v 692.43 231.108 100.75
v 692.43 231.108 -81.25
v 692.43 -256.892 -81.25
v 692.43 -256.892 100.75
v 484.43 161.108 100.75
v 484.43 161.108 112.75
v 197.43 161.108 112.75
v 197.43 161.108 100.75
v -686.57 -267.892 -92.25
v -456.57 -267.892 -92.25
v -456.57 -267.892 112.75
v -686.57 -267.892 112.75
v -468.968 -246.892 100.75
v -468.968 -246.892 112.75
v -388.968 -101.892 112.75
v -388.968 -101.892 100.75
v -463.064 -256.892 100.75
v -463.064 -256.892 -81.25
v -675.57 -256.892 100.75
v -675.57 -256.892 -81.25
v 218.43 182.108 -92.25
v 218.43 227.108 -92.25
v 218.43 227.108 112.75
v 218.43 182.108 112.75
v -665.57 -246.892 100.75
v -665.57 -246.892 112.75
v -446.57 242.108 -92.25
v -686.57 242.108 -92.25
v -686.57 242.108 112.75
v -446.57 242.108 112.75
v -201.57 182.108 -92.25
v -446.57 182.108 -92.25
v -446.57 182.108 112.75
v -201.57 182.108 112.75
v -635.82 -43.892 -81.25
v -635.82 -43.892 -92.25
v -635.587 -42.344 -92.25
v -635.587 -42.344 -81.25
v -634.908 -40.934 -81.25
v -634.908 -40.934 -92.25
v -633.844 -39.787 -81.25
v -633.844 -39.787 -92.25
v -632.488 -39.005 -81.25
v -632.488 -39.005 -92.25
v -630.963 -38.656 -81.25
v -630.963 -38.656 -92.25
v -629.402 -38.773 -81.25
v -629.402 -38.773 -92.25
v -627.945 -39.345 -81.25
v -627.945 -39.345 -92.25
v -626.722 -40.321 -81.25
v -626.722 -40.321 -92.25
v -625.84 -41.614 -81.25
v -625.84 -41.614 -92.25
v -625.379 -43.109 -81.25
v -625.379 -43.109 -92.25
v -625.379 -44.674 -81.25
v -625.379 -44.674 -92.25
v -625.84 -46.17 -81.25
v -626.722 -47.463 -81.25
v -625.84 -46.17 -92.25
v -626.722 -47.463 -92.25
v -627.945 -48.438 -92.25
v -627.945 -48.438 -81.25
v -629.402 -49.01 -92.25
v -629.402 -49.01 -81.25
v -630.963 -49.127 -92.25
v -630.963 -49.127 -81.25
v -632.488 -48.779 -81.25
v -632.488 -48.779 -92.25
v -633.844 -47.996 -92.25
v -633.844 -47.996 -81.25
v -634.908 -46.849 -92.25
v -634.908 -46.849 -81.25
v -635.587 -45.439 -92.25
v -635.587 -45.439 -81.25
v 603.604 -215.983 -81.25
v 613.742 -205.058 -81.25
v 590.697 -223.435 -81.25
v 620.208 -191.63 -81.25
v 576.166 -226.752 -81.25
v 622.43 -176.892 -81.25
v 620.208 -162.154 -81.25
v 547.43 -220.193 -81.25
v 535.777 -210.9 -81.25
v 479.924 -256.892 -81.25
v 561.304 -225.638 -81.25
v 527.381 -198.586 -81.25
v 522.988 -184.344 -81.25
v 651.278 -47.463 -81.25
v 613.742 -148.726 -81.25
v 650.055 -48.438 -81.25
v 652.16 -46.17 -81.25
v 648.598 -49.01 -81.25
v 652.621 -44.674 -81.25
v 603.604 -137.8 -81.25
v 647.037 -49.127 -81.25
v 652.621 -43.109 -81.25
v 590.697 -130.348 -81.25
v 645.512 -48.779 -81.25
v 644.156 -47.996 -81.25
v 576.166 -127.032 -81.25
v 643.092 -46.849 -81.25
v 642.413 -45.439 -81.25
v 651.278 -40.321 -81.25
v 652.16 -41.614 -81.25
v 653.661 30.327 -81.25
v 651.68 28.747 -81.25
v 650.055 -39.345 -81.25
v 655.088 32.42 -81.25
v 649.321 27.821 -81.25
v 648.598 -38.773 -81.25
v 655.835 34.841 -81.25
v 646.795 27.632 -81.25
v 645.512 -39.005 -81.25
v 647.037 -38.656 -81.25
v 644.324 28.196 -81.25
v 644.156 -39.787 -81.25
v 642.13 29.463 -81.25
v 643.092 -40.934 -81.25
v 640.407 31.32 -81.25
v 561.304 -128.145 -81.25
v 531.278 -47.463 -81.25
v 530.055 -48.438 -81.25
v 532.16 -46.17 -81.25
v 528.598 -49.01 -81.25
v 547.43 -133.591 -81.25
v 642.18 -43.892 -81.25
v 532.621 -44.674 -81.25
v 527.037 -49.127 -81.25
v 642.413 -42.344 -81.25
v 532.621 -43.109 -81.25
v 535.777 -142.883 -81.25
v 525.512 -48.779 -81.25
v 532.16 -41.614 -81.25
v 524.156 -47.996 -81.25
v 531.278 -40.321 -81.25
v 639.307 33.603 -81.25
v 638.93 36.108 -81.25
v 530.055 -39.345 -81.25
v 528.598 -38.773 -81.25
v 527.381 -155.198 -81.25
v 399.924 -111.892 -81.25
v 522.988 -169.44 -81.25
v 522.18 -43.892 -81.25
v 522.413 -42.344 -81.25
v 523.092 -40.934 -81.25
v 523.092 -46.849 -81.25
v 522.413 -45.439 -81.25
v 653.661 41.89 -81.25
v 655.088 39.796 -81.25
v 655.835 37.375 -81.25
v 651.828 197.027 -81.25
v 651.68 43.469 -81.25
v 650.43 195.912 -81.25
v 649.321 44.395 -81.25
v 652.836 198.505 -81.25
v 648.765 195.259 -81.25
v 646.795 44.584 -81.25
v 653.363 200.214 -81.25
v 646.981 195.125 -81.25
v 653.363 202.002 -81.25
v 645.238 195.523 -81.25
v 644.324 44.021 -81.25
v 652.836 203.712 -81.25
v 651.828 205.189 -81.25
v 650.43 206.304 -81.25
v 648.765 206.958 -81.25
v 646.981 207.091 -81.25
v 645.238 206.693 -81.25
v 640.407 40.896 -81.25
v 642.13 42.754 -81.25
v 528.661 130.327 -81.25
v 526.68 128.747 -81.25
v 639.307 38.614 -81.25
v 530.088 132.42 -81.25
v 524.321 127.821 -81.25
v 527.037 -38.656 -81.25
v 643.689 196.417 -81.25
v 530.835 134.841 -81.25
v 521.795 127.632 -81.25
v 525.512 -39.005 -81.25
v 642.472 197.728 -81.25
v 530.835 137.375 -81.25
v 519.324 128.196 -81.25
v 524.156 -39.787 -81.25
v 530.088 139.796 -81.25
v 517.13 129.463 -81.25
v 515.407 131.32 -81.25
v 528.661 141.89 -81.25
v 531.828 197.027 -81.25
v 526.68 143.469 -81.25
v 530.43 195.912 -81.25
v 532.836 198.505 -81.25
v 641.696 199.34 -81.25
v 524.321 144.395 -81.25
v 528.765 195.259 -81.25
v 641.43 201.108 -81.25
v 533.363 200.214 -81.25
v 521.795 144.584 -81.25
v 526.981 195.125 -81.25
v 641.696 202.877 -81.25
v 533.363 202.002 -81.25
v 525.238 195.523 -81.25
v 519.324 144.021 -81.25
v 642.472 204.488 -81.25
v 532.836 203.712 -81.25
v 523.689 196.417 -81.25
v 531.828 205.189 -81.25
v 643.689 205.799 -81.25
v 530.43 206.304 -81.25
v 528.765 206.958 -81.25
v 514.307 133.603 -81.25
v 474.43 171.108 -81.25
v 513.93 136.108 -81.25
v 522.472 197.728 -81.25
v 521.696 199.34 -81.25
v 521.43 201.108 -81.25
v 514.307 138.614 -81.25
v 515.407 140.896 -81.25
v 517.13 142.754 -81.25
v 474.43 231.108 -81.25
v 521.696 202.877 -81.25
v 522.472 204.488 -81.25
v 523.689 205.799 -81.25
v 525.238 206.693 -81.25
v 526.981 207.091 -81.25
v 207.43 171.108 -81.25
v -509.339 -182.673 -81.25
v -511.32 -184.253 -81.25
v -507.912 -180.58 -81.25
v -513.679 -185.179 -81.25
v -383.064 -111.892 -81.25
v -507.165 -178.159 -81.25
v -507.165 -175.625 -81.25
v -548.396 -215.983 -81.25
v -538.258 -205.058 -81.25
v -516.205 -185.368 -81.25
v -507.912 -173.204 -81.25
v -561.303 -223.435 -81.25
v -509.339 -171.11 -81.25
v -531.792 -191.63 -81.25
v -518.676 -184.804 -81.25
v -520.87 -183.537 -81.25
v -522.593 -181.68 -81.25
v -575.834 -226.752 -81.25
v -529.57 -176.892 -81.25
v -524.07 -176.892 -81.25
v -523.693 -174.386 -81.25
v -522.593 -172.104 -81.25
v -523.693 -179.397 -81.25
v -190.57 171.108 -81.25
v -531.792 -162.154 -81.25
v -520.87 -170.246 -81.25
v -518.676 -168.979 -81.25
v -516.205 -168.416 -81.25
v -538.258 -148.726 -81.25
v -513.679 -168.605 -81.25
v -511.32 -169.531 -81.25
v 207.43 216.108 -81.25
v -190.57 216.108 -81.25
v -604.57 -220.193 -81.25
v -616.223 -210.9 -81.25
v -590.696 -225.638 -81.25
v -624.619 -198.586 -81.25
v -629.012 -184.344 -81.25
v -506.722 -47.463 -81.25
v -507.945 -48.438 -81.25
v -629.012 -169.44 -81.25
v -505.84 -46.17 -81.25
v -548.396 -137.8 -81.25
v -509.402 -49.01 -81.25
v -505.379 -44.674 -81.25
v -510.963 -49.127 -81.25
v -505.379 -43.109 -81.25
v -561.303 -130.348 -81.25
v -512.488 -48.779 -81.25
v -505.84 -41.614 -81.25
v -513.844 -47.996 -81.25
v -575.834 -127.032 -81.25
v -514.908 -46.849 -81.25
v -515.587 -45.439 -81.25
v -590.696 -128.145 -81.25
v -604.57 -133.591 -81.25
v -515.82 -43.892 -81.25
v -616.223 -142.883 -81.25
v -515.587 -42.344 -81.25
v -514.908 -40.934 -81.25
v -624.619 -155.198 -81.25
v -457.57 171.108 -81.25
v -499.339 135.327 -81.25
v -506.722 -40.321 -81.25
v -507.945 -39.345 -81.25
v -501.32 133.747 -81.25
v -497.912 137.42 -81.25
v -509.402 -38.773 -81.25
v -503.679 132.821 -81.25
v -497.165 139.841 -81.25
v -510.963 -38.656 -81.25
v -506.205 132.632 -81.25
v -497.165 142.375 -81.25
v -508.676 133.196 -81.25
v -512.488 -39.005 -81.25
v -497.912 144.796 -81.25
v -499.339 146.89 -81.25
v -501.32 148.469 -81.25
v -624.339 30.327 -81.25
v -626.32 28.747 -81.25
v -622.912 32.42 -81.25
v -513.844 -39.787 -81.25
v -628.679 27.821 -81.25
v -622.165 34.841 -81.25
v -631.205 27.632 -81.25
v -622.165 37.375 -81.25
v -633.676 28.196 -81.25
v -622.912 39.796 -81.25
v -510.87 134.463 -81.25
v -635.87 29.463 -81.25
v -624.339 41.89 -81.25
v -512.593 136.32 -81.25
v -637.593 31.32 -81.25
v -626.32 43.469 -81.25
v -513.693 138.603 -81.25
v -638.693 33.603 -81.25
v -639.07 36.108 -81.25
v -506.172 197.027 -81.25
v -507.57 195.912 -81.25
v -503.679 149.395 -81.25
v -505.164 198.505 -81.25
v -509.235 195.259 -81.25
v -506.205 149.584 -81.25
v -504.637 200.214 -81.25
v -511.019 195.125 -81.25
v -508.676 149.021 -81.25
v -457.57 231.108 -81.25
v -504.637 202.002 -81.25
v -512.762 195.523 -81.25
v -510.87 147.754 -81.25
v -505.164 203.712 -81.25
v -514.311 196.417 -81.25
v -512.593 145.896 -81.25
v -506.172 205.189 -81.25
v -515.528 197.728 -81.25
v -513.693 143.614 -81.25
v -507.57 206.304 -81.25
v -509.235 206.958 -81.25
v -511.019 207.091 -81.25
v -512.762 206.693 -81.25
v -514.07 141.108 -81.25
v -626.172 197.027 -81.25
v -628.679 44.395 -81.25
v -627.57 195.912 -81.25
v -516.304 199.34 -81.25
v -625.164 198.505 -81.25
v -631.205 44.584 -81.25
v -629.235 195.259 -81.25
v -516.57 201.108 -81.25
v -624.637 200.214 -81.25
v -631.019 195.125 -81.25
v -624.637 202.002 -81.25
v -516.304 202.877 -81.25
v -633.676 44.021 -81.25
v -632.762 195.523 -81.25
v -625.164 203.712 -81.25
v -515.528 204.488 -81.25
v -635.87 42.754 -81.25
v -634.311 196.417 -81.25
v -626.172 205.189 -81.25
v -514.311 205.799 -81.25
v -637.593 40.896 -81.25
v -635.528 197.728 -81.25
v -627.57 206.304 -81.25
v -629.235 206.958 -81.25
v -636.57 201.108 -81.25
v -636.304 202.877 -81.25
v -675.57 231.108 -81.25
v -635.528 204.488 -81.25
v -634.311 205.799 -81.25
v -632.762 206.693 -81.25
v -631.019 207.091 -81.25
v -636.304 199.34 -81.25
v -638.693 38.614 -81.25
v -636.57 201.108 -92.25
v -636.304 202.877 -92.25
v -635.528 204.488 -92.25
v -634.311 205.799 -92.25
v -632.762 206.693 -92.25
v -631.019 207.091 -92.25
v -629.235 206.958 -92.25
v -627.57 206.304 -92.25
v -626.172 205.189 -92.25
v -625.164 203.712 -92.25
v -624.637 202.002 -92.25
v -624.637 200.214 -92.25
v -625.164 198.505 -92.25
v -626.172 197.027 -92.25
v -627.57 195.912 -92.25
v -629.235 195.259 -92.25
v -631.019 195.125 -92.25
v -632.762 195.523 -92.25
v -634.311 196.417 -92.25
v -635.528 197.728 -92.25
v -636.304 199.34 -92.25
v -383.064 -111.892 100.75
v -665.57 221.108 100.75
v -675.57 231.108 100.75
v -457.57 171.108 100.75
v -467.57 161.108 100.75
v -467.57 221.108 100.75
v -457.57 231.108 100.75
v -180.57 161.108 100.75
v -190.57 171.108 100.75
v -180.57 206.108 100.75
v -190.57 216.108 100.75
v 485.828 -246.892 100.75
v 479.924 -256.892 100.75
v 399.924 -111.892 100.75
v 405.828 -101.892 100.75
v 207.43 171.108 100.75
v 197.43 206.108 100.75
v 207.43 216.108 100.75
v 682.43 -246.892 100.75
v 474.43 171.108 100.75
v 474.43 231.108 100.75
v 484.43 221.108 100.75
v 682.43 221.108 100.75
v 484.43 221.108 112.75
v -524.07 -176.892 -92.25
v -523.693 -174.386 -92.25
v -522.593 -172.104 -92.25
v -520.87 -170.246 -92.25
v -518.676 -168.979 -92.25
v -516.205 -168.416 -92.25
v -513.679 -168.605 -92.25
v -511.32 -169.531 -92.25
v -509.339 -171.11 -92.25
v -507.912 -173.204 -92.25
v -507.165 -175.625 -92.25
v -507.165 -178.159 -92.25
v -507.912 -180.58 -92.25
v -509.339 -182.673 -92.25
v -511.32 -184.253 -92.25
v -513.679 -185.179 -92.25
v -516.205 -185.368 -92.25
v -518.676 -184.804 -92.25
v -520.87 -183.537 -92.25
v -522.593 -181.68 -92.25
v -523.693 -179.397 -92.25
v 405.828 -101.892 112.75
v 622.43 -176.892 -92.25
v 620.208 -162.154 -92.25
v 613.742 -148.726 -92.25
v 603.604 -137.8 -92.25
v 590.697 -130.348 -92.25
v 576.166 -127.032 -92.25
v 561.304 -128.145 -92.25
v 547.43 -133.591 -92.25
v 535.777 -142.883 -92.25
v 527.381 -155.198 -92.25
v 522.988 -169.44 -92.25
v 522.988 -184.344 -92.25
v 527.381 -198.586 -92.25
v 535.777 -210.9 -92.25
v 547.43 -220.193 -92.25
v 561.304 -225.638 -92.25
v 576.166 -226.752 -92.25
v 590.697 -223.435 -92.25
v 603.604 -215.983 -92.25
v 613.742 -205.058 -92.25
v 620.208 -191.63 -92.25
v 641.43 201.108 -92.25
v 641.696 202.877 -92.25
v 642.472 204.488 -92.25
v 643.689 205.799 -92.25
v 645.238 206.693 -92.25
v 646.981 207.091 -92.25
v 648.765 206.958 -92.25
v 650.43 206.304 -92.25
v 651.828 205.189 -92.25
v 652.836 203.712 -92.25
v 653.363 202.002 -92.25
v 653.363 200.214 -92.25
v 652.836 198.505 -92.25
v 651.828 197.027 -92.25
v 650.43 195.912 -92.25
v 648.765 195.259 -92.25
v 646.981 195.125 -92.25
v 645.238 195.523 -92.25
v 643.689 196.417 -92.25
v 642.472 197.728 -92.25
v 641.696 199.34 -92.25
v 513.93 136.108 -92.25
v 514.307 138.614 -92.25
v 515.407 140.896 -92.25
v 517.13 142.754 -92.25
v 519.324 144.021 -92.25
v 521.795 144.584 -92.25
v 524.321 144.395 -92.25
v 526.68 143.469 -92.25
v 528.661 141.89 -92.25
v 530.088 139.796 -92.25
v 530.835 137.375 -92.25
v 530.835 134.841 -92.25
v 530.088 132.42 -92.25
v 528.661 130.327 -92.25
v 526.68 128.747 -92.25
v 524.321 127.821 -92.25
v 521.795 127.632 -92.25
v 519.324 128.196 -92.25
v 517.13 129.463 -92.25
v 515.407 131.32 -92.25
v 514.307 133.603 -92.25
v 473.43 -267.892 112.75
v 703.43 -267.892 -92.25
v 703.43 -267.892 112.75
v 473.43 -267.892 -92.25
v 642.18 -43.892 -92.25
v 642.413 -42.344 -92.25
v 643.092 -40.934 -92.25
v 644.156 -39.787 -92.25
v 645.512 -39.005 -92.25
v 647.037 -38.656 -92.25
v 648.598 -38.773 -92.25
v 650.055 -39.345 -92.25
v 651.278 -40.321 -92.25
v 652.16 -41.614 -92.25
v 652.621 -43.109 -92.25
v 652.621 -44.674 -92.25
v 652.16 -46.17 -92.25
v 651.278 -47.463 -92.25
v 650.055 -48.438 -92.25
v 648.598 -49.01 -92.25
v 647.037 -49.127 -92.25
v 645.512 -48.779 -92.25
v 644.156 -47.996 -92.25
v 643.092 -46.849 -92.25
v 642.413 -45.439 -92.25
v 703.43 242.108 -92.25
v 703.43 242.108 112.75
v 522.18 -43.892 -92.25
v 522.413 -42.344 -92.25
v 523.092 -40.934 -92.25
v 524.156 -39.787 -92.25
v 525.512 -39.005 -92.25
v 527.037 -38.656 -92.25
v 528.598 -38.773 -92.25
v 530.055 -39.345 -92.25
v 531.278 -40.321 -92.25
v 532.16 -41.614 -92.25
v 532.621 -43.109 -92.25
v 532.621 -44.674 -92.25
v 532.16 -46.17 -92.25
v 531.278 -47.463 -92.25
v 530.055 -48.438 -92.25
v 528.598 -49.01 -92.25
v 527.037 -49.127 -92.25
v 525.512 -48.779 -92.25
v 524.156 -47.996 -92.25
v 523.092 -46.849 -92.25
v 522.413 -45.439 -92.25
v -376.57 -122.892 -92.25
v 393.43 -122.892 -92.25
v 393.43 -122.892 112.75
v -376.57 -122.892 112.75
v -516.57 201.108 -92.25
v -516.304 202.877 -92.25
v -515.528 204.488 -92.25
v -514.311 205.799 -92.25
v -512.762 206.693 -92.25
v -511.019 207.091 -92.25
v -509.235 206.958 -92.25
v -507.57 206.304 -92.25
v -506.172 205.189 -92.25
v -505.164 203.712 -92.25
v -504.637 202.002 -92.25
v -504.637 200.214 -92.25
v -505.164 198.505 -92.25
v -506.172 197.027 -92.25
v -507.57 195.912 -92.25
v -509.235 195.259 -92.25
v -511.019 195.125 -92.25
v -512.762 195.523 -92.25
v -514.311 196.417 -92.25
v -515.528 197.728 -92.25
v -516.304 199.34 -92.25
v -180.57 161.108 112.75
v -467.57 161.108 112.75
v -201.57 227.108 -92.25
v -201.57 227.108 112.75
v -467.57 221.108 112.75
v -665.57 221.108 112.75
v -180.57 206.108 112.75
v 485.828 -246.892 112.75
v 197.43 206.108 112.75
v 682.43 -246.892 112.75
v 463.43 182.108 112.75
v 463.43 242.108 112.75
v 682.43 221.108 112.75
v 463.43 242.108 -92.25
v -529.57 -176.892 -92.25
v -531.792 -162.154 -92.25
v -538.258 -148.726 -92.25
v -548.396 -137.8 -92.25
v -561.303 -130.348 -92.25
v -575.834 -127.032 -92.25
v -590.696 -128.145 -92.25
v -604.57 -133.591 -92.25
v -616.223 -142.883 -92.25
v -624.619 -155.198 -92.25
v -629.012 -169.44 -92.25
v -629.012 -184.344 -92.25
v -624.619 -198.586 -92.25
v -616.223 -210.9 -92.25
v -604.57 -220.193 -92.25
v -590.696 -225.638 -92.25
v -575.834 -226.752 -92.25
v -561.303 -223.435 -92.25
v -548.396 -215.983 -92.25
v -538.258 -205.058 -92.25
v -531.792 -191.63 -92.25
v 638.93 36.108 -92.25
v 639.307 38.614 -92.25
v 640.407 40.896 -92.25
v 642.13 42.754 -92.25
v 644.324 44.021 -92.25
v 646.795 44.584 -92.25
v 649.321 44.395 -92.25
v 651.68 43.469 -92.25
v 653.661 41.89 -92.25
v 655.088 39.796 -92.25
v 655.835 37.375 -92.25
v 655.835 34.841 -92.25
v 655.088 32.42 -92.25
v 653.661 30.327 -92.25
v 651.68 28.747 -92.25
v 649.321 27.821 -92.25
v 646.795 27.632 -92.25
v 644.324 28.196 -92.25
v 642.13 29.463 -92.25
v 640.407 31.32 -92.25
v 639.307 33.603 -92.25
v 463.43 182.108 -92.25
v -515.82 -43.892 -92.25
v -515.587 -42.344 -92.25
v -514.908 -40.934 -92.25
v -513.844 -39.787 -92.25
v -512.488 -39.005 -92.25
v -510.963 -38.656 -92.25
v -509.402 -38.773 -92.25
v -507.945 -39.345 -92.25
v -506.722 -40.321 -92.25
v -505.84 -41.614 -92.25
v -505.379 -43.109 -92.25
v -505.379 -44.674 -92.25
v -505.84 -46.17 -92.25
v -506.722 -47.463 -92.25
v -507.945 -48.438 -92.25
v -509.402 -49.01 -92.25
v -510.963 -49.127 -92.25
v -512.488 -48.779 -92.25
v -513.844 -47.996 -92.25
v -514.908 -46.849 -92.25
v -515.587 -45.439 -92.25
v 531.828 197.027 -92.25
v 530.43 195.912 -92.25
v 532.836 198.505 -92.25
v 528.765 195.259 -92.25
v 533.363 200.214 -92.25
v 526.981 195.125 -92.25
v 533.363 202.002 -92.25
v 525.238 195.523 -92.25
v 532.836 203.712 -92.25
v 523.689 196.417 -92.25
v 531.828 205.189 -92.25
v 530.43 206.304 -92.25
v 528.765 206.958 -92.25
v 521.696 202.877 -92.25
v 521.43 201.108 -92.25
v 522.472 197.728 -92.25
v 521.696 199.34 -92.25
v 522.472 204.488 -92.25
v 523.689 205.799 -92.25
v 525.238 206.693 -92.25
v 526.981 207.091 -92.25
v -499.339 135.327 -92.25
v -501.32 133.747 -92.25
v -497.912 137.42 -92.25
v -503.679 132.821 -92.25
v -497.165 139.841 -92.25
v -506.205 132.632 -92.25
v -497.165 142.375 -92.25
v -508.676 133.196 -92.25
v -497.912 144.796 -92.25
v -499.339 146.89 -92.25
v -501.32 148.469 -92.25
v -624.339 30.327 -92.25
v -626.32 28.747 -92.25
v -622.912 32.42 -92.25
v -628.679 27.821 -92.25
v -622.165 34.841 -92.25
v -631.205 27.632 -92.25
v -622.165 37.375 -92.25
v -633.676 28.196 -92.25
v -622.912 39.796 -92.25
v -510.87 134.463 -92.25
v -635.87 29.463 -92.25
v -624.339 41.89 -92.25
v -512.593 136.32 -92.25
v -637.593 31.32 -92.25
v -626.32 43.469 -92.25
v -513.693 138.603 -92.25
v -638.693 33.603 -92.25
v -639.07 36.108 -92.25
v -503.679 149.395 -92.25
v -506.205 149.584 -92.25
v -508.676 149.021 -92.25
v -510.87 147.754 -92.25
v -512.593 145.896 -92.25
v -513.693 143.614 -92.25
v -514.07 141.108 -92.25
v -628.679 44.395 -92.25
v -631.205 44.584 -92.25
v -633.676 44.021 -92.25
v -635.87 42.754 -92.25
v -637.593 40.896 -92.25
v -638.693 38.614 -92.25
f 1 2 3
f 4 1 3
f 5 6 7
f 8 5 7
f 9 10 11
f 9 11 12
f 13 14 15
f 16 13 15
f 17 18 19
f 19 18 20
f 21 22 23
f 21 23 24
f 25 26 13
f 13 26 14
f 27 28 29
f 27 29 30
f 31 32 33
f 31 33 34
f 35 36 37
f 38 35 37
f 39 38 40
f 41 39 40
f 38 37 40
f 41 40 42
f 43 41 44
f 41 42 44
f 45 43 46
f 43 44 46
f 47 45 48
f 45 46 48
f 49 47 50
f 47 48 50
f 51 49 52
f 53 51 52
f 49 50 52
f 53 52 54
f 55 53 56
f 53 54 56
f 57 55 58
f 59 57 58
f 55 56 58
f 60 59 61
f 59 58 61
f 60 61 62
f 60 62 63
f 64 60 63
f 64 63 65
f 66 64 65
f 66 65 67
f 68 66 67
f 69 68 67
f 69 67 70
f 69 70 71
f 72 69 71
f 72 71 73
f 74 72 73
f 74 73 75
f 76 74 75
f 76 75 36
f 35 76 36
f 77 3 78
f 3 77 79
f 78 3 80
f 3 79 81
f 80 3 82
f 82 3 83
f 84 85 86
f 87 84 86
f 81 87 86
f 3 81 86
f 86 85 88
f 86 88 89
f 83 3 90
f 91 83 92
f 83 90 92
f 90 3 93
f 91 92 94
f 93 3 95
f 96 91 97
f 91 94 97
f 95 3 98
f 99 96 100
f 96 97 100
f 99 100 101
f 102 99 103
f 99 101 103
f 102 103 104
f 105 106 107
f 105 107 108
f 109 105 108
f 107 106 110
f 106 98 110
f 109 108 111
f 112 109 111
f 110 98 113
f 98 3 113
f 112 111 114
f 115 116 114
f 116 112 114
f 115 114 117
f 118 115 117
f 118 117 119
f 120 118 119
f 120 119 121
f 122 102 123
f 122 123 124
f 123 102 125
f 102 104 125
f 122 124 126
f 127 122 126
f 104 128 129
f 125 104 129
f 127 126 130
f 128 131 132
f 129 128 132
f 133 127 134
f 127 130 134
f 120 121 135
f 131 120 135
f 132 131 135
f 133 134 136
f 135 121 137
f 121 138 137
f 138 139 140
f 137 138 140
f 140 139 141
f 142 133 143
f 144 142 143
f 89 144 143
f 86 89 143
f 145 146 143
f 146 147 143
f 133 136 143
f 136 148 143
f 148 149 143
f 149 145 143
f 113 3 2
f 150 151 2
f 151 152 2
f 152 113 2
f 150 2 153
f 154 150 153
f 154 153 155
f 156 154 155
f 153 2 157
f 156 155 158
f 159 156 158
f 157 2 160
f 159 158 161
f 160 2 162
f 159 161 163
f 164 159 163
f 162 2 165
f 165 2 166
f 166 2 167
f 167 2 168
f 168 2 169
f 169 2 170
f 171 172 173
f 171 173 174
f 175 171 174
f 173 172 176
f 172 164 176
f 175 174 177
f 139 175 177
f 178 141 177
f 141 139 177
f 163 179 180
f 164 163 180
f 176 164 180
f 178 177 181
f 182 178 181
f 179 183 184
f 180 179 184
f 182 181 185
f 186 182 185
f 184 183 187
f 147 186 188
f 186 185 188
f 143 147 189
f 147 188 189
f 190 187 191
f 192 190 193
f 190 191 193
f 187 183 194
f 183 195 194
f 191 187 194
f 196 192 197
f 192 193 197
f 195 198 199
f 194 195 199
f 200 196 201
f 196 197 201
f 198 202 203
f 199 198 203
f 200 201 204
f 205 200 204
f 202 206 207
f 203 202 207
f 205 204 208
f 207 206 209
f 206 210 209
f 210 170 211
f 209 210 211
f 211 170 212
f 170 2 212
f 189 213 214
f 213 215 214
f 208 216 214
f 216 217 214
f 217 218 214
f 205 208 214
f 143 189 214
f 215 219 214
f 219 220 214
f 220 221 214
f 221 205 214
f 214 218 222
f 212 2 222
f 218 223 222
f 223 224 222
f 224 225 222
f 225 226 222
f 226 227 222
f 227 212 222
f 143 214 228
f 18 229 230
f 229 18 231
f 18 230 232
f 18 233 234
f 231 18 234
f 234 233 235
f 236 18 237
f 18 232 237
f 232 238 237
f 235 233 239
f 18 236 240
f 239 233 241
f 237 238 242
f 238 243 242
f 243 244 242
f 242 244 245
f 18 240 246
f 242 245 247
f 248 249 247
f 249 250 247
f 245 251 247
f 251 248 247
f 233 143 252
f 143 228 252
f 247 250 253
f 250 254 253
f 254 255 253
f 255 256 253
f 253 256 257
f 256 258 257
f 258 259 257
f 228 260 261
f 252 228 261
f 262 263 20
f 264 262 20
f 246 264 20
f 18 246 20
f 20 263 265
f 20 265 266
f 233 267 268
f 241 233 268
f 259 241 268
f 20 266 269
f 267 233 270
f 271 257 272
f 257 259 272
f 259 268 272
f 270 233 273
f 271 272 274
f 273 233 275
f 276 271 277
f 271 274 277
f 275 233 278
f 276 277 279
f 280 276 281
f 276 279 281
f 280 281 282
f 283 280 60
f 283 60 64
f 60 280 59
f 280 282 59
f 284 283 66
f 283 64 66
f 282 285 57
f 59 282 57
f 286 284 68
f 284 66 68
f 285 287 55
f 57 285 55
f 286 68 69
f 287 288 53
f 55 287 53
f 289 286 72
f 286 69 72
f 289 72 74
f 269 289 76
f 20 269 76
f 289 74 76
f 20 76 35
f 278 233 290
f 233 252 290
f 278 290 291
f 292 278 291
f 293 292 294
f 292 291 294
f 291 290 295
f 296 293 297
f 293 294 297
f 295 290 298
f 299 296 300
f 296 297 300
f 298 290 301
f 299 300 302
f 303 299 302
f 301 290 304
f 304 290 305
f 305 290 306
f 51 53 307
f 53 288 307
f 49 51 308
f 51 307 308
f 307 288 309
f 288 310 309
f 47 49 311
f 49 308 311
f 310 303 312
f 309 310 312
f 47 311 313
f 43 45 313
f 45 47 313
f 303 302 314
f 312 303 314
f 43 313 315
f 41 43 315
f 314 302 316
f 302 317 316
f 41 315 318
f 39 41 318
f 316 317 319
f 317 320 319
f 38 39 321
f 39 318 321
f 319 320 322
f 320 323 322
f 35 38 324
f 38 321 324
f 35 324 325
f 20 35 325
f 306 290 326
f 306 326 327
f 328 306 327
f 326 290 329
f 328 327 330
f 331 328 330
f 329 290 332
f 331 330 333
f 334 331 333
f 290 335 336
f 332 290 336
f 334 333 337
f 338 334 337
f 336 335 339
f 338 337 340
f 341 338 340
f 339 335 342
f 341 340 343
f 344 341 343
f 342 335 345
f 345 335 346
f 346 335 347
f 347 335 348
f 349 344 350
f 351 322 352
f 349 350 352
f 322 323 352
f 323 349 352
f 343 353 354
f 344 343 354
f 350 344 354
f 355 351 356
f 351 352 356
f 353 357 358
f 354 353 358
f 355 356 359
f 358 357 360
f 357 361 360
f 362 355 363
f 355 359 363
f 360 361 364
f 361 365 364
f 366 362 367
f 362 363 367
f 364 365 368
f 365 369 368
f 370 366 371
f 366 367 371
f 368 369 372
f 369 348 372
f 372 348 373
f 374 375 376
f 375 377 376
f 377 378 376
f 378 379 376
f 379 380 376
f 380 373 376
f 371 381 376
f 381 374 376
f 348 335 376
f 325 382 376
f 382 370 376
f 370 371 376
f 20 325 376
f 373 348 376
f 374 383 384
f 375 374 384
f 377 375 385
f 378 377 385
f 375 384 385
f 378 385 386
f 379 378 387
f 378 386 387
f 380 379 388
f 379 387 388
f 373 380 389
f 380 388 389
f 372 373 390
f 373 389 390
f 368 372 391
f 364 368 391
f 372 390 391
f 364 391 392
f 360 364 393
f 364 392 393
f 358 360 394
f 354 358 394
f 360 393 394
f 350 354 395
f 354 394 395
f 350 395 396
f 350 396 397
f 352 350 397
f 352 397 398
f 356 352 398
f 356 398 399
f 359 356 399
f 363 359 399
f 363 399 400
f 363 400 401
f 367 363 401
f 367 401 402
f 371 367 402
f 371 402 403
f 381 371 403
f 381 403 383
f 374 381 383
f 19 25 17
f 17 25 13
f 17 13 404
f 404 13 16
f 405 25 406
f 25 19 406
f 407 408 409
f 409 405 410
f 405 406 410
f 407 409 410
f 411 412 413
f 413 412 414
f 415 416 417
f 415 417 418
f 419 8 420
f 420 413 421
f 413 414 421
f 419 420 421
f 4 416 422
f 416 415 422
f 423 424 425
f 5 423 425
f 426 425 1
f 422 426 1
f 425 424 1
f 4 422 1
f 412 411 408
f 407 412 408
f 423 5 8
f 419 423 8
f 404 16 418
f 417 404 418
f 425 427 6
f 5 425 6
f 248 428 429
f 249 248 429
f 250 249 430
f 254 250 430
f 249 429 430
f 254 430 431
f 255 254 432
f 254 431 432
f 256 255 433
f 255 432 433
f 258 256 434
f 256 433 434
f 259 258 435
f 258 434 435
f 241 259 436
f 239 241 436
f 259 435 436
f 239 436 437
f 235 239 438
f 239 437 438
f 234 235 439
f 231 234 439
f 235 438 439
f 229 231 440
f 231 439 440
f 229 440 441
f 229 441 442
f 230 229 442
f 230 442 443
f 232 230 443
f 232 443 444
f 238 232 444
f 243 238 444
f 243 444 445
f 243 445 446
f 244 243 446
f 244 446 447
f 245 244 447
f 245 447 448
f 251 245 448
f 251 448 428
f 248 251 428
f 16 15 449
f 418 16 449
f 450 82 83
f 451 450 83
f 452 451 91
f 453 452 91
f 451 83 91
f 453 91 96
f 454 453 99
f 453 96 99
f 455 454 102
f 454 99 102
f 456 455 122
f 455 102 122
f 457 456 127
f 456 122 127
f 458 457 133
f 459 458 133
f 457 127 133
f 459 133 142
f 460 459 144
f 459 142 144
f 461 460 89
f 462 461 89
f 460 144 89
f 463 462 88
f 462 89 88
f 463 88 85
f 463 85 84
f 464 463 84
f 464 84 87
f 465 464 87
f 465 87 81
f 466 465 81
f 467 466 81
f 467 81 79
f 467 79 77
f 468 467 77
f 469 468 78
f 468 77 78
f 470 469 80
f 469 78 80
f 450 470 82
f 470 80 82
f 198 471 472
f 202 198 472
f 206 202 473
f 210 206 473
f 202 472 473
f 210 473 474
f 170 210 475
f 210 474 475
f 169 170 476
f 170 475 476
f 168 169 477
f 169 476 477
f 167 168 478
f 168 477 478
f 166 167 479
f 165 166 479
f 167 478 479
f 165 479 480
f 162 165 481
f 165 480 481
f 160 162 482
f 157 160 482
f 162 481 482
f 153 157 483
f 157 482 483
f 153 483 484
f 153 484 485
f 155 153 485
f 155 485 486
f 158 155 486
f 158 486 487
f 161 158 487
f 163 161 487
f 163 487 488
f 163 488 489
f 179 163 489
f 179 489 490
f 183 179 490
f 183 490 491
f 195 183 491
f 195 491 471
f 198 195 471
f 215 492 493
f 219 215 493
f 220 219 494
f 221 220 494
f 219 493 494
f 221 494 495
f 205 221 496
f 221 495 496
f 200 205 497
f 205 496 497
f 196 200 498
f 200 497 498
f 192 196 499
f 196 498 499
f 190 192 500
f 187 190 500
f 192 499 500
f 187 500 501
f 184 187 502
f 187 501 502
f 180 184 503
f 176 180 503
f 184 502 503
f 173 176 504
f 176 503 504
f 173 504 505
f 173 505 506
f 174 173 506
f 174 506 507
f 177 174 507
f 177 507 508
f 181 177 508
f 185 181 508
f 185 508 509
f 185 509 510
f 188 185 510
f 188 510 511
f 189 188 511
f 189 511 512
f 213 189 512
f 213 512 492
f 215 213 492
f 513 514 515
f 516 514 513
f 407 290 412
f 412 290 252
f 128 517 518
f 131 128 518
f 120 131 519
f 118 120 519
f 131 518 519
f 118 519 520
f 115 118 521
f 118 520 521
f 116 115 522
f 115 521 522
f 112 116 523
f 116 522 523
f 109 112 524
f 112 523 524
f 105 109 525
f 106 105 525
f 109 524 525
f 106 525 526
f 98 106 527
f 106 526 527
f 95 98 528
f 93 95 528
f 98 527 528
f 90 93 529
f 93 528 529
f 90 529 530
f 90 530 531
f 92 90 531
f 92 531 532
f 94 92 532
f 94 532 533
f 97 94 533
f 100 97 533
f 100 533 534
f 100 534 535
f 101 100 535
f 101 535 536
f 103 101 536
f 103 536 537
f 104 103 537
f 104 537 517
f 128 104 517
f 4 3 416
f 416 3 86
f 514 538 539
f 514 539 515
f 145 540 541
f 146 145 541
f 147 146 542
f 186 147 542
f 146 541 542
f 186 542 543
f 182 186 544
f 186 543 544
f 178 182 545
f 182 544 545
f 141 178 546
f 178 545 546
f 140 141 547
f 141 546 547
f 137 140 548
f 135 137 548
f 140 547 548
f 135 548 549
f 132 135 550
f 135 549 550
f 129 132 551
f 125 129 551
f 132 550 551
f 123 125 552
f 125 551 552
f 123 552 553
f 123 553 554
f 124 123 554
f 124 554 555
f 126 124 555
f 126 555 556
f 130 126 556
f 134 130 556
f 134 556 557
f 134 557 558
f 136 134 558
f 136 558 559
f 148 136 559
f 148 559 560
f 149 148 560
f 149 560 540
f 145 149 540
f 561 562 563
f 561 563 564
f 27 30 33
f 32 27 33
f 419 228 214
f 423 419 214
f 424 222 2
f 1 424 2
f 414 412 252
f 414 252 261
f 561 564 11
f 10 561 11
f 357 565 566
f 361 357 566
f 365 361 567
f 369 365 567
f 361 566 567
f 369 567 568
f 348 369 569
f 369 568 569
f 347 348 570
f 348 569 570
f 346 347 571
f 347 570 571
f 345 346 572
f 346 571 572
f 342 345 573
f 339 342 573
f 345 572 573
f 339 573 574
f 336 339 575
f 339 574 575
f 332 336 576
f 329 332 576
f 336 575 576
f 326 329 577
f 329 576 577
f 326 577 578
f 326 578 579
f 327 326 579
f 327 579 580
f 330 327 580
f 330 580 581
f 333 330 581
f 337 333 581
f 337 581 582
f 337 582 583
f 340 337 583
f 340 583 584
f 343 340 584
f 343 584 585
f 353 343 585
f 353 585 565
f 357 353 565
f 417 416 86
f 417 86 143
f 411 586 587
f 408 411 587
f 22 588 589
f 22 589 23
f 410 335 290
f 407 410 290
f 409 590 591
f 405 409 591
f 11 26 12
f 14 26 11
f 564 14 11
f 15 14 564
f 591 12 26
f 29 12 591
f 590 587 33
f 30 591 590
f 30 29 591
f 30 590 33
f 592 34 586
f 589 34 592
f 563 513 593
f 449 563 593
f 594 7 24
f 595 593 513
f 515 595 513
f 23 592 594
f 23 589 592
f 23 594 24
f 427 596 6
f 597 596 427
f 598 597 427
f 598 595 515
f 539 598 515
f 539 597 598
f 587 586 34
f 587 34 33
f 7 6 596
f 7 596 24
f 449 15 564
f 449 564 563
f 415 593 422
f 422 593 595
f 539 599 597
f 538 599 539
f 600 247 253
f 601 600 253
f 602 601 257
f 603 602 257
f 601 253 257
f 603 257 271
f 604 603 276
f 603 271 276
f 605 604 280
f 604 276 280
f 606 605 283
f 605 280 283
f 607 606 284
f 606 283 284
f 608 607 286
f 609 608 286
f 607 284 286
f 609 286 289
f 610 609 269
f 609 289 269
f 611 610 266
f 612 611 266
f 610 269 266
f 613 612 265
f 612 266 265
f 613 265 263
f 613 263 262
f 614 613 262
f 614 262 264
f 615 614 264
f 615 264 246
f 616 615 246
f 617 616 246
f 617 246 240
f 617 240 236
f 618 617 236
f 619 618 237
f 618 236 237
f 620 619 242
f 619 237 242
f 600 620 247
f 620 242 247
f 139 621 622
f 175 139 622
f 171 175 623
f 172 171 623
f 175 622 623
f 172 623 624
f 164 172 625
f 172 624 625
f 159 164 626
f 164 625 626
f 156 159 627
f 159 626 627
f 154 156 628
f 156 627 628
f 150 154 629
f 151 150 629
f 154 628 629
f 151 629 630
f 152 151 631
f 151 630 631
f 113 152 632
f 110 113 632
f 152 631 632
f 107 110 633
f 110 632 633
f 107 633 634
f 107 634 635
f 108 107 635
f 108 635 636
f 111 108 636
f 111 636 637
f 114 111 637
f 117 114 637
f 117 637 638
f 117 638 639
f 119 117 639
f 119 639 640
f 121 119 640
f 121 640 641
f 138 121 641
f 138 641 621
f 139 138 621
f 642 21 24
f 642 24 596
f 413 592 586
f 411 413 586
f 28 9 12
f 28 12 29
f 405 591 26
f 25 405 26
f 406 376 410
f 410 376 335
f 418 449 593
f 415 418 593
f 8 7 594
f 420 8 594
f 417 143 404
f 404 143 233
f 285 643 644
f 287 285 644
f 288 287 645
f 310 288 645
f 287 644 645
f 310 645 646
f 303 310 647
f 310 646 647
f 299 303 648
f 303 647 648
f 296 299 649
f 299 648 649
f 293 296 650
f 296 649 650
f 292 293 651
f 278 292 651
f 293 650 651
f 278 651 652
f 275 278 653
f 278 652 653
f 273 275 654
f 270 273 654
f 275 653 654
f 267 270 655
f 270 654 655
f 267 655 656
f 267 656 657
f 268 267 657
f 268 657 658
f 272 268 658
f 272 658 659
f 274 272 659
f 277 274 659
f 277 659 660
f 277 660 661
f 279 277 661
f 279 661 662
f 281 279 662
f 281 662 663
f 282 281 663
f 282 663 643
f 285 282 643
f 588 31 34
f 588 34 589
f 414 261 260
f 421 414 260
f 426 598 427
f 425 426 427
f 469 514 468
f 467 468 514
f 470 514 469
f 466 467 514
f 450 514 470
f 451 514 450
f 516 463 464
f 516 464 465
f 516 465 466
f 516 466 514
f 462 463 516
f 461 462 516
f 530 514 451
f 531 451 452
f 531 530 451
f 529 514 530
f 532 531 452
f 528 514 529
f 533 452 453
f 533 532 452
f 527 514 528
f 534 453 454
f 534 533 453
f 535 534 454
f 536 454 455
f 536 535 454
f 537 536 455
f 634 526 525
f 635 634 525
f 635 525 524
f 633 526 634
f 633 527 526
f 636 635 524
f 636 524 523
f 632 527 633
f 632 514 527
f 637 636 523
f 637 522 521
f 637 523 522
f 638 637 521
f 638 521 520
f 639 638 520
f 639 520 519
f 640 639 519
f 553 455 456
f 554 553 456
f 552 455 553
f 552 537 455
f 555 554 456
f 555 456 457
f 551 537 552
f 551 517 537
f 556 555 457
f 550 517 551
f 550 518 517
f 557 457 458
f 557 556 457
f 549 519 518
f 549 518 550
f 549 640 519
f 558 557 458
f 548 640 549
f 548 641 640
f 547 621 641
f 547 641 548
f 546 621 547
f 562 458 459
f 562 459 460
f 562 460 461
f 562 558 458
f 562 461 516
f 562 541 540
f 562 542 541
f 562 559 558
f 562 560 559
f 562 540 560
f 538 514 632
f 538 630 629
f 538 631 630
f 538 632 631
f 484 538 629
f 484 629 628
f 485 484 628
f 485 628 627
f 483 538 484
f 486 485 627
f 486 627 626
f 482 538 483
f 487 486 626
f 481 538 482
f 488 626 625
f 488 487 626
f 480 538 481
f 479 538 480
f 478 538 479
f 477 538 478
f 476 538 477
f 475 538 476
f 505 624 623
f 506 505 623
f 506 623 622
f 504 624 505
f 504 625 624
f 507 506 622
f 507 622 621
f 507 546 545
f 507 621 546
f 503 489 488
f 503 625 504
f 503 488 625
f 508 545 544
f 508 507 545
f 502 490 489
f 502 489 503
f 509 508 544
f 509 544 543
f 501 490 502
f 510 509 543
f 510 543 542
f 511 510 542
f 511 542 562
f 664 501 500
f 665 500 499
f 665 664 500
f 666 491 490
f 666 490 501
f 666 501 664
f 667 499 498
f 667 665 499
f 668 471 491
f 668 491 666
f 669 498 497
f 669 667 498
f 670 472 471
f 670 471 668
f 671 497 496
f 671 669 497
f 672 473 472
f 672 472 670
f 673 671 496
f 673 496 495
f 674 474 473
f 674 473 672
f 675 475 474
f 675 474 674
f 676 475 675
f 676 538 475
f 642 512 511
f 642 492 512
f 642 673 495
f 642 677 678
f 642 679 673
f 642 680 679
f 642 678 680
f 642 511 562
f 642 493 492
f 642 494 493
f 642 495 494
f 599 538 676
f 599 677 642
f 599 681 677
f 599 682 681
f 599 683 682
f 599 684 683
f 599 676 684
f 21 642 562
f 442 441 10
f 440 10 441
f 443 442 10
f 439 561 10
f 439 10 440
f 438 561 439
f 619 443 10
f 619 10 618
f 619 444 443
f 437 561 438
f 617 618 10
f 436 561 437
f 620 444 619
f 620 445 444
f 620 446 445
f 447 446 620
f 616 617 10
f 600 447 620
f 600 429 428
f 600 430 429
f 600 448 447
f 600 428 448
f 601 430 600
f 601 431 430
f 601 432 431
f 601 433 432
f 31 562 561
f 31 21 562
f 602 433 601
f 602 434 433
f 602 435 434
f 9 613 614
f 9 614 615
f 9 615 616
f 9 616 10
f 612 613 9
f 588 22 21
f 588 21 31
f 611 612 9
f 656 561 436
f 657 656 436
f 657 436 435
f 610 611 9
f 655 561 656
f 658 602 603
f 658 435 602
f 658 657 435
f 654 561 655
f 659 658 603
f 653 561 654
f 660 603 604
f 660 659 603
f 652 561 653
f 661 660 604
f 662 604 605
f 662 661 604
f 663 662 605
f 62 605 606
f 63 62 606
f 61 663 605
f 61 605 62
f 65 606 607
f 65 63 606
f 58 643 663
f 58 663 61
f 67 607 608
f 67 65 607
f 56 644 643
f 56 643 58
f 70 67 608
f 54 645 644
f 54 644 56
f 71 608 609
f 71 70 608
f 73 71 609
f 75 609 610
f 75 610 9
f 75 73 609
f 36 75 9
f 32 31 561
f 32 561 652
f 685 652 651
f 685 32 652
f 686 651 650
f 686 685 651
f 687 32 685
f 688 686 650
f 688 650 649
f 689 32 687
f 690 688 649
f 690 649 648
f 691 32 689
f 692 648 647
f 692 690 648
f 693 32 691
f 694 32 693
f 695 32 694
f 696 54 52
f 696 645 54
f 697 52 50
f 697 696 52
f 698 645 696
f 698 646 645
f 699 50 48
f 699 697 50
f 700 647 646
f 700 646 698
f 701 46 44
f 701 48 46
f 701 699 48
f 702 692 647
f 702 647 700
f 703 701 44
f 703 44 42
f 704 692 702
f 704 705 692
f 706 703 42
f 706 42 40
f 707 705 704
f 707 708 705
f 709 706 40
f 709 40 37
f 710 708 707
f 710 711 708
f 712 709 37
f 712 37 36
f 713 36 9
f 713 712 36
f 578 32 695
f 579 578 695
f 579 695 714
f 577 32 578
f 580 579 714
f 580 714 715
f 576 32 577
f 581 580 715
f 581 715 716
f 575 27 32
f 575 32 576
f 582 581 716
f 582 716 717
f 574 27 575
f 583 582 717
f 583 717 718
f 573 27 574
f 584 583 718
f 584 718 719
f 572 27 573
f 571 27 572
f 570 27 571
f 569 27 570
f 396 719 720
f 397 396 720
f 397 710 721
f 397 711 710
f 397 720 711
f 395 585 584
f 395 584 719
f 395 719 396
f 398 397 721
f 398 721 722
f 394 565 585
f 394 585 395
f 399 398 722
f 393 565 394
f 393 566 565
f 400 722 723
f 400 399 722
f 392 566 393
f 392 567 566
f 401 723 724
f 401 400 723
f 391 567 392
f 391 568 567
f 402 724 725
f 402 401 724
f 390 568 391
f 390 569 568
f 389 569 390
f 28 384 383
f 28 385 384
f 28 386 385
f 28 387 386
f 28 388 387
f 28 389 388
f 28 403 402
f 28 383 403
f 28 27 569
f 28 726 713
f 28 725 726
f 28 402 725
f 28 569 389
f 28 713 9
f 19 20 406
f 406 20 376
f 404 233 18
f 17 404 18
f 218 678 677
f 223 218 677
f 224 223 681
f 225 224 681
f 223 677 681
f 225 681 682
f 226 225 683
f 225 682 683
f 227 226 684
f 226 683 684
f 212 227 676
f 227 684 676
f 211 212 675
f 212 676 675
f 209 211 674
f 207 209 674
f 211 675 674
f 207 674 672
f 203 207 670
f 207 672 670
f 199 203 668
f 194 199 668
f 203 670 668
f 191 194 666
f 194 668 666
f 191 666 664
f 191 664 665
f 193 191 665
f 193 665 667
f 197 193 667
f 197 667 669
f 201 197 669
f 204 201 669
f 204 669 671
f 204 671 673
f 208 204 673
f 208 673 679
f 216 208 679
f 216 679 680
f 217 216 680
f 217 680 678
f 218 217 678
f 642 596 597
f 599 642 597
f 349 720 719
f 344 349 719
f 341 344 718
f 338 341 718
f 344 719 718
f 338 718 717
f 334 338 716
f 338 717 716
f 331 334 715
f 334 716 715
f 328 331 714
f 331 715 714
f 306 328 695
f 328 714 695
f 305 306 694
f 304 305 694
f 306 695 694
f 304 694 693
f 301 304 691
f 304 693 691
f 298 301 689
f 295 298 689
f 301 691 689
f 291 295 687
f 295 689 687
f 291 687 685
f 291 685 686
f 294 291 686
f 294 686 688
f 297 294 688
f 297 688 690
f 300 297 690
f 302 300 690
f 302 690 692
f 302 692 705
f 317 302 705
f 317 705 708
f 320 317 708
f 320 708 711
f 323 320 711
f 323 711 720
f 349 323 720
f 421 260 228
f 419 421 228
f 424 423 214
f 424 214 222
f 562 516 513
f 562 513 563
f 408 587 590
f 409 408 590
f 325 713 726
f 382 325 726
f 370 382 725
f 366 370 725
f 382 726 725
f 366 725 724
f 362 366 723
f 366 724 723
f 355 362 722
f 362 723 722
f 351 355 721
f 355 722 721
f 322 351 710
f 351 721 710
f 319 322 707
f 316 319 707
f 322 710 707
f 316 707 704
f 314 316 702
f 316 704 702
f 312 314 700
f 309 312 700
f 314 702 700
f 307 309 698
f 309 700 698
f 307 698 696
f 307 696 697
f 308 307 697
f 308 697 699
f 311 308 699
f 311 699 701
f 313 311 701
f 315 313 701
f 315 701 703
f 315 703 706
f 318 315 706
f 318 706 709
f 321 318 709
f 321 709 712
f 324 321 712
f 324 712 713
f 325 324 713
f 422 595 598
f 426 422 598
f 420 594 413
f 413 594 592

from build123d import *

# Parameters (mm, degrees)
EXTRUDE_1_DEPTH         = 20.5
SCALE_1_SCALE           = 10
SHELL_1_T               = -11
EXTRUDE_2_DEPTH         = 12
HOLE_WIZARD_17_0_17_1_D = 17
M12X1_25_2_D            = 10.5
F_12_0MM_1_D            = 12
SKETCH_27_R             = 50
CUT_EXTRUDE_1_DEPTH     = 11


with BuildPart() as part:
    # 草图1 → 凸台-拉伸1 (new body)
    with BuildSketch(Plane.XY):
        Polygon((-61.070262854, 36.5), (-37.070262854, 36.5), (-37.070262854, 30.5), (-12.570262854, 30.5), (-12.570262854, 35), (29.429737146, 35), (29.429737146, 30.5), (53.929737146, 30.5), (53.929737146, 36.5), (77.929737146, 36.5), (77.929737146, -14.5), (54.929737146, -14.5), (46.929737146, 0), (-30.070262854, 0), (-38.070262854, -14.5), (-61.070262854, -14.5), align=None)
    extrude(amount=EXTRUDE_1_DEPTH)


with BuildPart() as part_1:
    # 缩放比例1: scaled about (8.429737146, 13.654642846, 10.25)
    add(part.part.scale(SCALE_1_SCALE).moved(Location((-75.867634314, -122.891785614, -92.25))))

    # 抽壳1
    shell_1_openings = [part_1.faces().sort_by_distance(p)[0] for p in [
        (8.429737147, 13.654642849, 112.75),
    ]]
    offset(amount=SHELL_1_T, openings=shell_1_openings, kind=Kind.INTERSECTION)

    # 草图12 → 凸台-拉伸2 (add)
    with BuildSketch(Plane.XY.offset(112.75)):
        Polygon((-675.570262854, 231.108214383), (-675.570262854, -256.891785617), (-463.064431597, -256.891785617), (-383.064431597, -111.891785617), (399.923905889, -111.891785617), (479.923905889, -256.891785617), (692.429737146, -256.891785617), (692.429737146, 231.108214383), (474.429737146, 231.108214383), (474.429737146, 171.108214383), (207.429737146, 171.108214383), (207.429737146, 216.108214383), (-190.570262854, 216.108214383), (-190.570262854, 171.108214383), (-457.570262854, 171.108214383), (-457.570262854, 231.108214383), align=None)
        Polygon((-665.570262854, 221.108214383), (-665.570262854, -246.891785617), (-468.968221364, -246.891785617), (-388.968221364, -101.891785617), (405.827695656, -101.891785617), (485.827695656, -246.891785617), (682.429737146, -246.891785617), (682.429737146, 221.108214383), (484.429737146, 221.108214383), (484.429737146, 161.108214383), (197.429737146, 161.108214383), (197.429737146, 206.108214383), (-180.570262854, 206.108214383), (-180.570262854, 161.108214383), (-467.570262854, 161.108214383), (-467.570262854, 221.108214383), align=None, mode=Mode.SUBTRACT)
    extrude(amount=-EXTRUDE_2_DEPTH)

    # Ø17.0 (17) 直径孔1 (through all)
    with Locations(Plane.XY.offset(-81.25)):
        with Locations((-505.570262854, 141.108214383), (-630.570262854, 36.108214383), (-515.570262854, -176.891785617), (647.429737146, 36.108214383), (522.429737146, 136.108214383), (532.429737146, -176.891785617)):
            Hole(HOLE_WIZARD_17_0_17_1_D / 2)

    # M12x1.25 螺纹孔2 (through all)
    with Locations(Plane.XY.offset(-81.25)):
        with Locations((-630.570262854, -43.891785617), (-510.570262854, -43.891785617), (527.429737146, -43.891785617), (647.429737146, -43.891785617)):
            Hole(M12X1_25_2_D / 2)

    # Ø12.0mm 暗销孔1 (through all)
    with Locations(Plane(origin=(-630.570262854, 201.108214383, -81.25), x_dir=(1, 0, 0), z_dir=(0, 0, 1))):
        with Locations((0, 0), (120, 0), (1158, 0), (1278, 0)):
            Hole(F_12_0MM_1_D / 2)

    # 草图27 → 切除-拉伸1 (cut)
    with BuildSketch(Plane.XY.offset(-81.25)):
        with Locations((572.429737146, -176.891785617)):
            Circle(SKETCH_27_R)
        with Locations((-579.570262855, -176.891785617)):
            Circle(SKETCH_27_R)
    extrude(amount=-CUT_EXTRUDE_1_DEPTH, mode=Mode.SUBTRACT)


solid = part_1.part
